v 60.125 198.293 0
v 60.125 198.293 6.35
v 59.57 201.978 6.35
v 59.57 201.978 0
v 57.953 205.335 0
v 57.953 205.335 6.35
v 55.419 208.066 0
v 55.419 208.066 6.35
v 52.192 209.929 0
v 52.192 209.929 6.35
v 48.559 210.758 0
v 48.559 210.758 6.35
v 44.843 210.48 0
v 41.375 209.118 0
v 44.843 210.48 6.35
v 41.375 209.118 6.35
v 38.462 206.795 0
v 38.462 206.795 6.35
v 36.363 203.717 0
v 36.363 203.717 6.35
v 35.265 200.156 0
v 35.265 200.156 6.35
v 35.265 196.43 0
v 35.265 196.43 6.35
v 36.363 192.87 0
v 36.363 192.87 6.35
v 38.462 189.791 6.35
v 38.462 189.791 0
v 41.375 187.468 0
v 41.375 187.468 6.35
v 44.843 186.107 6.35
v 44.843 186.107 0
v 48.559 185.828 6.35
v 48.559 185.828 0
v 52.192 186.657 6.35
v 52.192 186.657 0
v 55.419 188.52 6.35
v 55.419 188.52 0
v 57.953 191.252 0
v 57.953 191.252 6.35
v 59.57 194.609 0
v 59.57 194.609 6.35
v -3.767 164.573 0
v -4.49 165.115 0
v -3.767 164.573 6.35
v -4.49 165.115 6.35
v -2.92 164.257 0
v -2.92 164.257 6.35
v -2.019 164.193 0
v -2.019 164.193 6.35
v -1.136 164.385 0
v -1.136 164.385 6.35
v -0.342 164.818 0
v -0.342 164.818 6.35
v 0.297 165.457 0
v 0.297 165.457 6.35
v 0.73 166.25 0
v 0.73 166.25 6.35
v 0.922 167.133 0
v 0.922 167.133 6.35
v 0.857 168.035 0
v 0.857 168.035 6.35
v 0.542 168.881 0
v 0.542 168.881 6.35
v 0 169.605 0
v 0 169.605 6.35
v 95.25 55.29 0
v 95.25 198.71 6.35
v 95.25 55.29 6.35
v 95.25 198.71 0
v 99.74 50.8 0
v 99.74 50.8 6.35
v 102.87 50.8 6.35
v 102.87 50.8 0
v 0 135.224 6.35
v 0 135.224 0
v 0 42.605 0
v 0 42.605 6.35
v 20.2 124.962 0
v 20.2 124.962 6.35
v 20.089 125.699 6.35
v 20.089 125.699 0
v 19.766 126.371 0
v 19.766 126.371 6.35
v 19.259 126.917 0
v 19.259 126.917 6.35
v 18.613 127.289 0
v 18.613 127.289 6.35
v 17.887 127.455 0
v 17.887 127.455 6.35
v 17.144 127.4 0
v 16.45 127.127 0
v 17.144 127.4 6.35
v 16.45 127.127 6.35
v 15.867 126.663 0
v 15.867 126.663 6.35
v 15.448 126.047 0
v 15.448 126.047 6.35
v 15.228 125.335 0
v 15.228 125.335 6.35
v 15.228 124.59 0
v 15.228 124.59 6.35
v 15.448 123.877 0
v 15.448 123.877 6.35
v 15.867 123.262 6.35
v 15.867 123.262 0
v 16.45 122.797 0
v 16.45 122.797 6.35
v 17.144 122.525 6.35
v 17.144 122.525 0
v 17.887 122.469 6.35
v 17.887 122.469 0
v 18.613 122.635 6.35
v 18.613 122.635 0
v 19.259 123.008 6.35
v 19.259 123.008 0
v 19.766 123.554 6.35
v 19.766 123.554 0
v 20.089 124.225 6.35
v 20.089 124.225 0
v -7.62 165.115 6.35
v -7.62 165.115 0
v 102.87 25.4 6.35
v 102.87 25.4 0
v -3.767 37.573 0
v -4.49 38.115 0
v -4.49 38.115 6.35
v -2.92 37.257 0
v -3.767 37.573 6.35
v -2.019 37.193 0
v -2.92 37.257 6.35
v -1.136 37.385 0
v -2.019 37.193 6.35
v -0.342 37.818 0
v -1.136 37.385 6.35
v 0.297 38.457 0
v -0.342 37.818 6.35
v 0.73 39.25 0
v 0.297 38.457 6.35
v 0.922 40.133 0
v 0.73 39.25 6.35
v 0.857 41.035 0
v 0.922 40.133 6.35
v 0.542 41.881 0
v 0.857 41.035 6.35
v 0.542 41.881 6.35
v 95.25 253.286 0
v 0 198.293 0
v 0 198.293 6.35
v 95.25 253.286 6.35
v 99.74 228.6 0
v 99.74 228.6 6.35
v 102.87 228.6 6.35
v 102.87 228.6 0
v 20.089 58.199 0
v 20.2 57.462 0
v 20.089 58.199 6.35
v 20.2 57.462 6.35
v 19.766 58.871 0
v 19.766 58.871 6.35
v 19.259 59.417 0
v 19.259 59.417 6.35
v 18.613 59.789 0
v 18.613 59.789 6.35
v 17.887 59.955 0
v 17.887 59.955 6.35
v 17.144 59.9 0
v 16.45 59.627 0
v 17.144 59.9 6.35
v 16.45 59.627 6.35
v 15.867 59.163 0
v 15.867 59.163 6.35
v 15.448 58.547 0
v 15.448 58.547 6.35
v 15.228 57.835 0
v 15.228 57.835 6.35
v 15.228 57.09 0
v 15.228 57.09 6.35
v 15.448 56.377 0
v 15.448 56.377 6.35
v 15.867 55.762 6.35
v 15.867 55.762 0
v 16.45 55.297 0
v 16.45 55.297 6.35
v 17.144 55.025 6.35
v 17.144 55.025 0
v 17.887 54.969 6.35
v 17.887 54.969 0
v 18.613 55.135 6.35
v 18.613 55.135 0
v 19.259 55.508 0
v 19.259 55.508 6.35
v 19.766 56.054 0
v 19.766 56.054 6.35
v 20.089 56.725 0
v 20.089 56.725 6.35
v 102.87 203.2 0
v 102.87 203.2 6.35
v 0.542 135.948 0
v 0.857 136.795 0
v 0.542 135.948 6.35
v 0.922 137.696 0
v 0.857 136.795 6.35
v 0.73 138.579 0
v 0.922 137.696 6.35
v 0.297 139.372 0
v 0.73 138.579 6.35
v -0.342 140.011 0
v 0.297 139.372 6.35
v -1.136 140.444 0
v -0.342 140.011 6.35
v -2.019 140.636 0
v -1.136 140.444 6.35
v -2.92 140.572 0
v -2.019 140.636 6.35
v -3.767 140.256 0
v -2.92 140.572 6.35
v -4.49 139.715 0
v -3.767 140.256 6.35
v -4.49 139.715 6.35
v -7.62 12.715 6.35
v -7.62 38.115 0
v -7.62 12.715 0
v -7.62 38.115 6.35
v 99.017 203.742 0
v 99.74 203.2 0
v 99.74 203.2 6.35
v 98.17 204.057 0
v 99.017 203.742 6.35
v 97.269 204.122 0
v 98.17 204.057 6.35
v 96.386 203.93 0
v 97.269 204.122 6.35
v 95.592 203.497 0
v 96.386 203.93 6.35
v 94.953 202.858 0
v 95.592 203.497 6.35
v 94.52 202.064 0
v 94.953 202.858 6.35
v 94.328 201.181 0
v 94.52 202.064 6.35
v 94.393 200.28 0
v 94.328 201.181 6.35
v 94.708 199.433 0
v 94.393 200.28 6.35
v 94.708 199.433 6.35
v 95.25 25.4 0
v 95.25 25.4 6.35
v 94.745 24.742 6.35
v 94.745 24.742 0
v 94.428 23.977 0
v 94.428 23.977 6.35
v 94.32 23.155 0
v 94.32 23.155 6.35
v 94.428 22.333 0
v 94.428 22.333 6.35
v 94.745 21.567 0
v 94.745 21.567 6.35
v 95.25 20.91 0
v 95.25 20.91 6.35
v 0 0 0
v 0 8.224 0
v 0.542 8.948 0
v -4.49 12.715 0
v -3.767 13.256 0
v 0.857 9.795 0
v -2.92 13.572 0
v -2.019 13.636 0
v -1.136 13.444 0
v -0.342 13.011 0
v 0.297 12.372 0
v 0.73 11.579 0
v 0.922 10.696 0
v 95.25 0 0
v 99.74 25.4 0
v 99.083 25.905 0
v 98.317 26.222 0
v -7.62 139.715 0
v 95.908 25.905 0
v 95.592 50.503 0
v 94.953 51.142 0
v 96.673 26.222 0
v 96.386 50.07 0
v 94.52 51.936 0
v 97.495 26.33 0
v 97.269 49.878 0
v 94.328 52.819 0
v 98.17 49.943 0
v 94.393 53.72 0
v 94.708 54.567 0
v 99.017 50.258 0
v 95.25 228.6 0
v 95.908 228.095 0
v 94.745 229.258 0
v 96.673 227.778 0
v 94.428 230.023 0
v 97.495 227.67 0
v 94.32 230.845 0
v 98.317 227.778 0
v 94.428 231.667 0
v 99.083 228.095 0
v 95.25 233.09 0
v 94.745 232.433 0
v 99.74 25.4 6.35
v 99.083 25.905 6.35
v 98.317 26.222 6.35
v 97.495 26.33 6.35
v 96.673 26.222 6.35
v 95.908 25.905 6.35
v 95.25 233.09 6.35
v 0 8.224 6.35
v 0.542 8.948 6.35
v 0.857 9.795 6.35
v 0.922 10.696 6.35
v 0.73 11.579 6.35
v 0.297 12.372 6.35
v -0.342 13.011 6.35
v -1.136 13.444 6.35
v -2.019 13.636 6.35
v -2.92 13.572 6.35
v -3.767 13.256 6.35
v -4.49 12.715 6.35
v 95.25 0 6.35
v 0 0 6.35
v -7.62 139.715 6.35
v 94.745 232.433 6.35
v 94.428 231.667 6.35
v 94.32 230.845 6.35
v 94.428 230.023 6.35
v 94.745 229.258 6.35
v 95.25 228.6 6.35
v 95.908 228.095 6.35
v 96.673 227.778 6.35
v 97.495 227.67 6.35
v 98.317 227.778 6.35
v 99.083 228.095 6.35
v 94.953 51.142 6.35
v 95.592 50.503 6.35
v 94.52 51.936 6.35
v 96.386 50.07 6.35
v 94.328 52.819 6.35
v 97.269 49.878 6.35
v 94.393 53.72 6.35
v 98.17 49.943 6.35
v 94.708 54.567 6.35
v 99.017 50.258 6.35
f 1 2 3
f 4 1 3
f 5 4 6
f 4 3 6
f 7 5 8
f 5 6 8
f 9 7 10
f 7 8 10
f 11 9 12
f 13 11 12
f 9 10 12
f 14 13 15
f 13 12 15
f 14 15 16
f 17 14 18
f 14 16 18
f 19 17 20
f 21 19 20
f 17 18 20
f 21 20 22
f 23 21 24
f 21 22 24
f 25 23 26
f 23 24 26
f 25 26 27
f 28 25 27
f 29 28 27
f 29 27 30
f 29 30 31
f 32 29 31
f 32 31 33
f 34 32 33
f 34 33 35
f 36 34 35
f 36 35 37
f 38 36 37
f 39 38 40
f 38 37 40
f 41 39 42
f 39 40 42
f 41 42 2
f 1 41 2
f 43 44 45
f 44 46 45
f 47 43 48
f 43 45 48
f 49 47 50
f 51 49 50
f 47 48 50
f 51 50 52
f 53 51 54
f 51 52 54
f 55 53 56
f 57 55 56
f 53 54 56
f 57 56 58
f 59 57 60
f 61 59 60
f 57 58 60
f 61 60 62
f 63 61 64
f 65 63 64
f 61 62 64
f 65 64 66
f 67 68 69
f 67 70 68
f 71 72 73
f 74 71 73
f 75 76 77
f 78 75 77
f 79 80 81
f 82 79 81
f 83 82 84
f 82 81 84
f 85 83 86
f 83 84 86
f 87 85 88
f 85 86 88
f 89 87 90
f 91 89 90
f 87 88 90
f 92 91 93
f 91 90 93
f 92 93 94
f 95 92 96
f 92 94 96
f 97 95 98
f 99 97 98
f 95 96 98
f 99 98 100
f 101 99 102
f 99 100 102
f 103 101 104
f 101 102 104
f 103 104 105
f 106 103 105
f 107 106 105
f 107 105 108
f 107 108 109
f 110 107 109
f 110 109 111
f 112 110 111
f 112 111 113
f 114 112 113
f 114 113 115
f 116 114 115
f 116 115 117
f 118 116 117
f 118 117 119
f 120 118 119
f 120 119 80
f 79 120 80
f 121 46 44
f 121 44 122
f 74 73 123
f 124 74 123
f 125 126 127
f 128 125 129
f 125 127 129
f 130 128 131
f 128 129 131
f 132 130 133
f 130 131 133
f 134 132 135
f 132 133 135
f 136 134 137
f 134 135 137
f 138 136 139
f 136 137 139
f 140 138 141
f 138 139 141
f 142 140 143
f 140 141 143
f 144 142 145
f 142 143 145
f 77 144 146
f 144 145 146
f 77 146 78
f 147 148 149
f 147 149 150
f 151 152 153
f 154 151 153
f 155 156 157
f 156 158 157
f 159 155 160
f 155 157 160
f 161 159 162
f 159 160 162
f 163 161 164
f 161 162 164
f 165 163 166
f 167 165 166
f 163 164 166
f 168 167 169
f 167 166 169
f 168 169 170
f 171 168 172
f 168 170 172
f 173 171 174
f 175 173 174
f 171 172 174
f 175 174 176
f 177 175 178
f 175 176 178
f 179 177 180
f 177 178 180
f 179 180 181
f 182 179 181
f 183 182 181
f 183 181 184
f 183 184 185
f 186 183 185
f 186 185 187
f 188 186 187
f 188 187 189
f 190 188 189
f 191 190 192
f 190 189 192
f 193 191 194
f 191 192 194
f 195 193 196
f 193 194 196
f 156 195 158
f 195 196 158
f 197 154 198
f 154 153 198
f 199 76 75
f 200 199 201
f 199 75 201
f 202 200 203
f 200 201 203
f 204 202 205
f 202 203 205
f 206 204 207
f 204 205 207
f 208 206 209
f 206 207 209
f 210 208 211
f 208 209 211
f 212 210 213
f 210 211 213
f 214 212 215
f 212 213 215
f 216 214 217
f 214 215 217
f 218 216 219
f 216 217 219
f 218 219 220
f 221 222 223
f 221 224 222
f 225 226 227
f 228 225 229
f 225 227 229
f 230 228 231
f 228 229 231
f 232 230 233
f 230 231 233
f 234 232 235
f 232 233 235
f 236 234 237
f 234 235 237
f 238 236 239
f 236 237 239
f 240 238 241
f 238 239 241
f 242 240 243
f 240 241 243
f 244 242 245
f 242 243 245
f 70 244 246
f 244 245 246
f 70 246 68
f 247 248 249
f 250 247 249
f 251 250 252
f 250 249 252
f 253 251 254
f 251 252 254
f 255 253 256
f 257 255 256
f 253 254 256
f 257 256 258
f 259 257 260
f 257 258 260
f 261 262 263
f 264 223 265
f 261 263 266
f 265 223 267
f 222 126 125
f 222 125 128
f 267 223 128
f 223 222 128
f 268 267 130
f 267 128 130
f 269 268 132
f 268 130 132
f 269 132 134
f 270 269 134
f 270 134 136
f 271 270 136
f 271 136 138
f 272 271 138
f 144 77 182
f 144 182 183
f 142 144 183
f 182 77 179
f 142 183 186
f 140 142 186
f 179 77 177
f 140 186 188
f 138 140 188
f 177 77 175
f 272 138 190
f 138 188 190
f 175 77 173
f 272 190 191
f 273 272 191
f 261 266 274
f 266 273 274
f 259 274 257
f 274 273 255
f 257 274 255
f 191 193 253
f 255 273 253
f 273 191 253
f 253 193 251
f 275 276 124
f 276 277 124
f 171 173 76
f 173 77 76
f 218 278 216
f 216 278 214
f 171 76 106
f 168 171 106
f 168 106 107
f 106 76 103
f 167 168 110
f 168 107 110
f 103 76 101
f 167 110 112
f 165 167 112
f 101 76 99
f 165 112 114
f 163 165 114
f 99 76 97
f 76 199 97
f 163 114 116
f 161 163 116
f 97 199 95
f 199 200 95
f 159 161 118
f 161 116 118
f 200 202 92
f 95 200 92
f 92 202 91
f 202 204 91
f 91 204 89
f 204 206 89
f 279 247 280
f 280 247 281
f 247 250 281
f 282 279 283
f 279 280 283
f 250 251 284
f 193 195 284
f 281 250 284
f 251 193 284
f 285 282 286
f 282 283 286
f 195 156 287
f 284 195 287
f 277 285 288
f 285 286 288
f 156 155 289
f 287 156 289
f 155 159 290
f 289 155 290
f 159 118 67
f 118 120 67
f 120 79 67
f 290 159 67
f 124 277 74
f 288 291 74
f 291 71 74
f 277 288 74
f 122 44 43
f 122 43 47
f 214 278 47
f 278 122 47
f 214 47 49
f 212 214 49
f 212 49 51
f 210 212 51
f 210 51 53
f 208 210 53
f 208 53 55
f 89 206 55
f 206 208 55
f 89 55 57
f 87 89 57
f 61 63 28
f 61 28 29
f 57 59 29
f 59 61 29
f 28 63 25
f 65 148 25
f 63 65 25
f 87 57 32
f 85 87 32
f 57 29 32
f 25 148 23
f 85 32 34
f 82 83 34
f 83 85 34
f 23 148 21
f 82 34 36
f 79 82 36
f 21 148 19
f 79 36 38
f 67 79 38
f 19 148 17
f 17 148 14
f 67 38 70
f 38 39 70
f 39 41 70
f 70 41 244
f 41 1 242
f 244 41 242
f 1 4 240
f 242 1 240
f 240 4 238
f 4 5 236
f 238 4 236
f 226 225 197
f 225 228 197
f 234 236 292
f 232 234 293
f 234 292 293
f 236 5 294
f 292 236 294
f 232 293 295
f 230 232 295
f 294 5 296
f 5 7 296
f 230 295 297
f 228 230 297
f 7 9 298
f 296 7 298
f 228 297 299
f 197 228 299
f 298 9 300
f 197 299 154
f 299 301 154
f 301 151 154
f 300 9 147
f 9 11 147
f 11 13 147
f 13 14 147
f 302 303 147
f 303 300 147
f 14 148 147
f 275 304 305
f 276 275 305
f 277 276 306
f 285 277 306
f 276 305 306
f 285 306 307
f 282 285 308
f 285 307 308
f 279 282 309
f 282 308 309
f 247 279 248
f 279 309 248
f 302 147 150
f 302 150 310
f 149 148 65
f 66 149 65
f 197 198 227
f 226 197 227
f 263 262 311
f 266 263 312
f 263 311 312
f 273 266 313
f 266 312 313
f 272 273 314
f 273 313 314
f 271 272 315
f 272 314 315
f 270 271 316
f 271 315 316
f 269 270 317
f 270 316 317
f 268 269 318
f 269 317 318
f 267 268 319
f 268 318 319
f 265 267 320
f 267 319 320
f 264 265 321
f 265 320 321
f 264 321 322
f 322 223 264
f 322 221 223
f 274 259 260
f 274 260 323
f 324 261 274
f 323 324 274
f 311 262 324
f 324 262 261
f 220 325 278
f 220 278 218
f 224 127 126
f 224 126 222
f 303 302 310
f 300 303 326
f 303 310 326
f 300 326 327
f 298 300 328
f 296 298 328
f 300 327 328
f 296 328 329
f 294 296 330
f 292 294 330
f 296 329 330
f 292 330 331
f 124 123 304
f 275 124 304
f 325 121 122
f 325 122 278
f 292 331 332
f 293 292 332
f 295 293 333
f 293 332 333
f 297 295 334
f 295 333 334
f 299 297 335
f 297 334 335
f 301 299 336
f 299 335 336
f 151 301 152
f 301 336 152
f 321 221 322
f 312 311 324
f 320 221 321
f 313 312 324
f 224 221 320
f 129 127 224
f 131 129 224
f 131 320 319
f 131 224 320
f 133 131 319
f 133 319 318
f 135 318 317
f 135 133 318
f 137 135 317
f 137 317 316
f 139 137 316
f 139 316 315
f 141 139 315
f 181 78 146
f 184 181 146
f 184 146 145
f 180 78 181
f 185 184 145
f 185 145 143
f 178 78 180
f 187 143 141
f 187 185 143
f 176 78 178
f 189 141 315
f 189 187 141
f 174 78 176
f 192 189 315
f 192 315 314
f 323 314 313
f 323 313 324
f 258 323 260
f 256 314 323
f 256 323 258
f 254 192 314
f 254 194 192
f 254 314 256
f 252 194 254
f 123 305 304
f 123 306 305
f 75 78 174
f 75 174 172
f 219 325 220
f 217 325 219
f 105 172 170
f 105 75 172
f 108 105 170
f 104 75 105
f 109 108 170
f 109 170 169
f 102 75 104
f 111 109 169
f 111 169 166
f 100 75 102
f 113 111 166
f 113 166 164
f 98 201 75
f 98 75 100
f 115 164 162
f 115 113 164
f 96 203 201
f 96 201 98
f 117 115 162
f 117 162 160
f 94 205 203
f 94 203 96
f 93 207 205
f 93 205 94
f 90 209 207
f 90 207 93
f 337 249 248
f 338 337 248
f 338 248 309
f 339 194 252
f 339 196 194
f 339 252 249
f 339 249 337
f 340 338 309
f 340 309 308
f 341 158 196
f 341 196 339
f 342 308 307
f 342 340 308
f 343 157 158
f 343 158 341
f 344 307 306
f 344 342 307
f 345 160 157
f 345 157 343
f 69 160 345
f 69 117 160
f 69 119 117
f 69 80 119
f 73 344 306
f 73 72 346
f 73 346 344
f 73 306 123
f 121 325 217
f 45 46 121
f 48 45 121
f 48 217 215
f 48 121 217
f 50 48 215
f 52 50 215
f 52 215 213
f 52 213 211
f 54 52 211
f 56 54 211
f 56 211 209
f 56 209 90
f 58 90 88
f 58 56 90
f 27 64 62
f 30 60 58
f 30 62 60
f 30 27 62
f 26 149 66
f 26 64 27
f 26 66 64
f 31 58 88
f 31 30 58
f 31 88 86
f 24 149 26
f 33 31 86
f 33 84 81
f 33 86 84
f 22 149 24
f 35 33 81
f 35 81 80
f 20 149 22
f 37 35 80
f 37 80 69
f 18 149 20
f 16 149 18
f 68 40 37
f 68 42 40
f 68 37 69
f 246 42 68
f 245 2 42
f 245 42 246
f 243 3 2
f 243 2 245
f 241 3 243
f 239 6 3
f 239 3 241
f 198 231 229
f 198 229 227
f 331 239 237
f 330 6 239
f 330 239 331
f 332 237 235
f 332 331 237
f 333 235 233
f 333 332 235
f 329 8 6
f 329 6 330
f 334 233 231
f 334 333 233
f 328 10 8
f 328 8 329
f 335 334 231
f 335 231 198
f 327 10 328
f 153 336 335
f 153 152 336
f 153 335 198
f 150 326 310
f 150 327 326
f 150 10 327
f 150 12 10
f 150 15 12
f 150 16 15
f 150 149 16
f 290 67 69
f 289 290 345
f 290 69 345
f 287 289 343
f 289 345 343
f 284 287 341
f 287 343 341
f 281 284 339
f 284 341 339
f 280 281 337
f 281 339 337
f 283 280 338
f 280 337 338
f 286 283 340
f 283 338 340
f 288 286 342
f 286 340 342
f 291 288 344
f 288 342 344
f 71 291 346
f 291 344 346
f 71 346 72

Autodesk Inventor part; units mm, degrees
ref_plane "YZ Plane" through (0, 0, 0) normal (1, 0, 0) x (0, 1, 0)
ref_plane "XZ Plane" through (0, 0, 0) normal (0, 1, 0) x (-1, 0, 0)
ref_plane "XY Plane" through (0, 0, 0) normal (0, 0, 1) x (1, 0, 0)
sketch "Sketch1" plane through (0, 0, 0) normal (0, 0, 1) x (1, 0, 0)
  line L0 (0, 0) -> (95.25, 0)
  line L1 (95.25, 0) -> (95.25, 198.2931)
  line L2 (95.25, 198.2931) -> (0, 198.2931)
  line L3 (0, 198.2931) -> (0, 0)
  line L4 (0, 198.2931) -> (95.25, 253.2857)
  line L5 (95.25, 253.2857) -> (95.25, 198.2646)
  dimension "d0" = 95.25
  dimension "d1" = 198.293
  dimension "d2" = 60
extrude "Extrusion1" add sketch "Sketch1" along normal blind 6.35
sketch "Sketch2" plane through (0, 0, 6.35) normal (0, 0, 1) x (1, 0, 0)
  line L0 (0, 198.2931) -> (0, 0) projected
  line L1 (0, 38.1146) -> (-7.62, 38.1146)
  line L2 (-7.62, 38.1146) -> (-7.62, 12.7146)
  line L3 (-7.62, 12.7146) -> (0, 12.7146)
  line L4 (0, 12.7146) -> (0, 38.1146)
  line L5 (0, 165.1146) -> (-7.62, 165.1146)
  line L6 (-7.62, 165.1146) -> (-7.62, 139.7146)
  line L7 (-7.62, 139.7146) -> (0, 139.7146)
  line L8 (0, 139.7146) -> (0, 165.1146)
  line L9 (0, 0) -> (95.25, 0) projected
  dimension "d5" = 7.62
  dimension "d6" = 25.4
  dimension "d7" = 25.4
  dimension "d8" = 101.6
  dimension "d9" = 12.7146
extrude "Extrusion2" add sketch "Sketch2" against normal blind 6.35
sketch "Sketch3" plane through (0, 0, 6.35) normal (0, 0, 1) x (1, 0, 0)
  line L0 (95.25, 0) -> (95.25, 253.2857) projected
  line L1 (95.25, 228.6) -> (102.87, 228.6)
  line L2 (102.87, 228.6) -> (102.87, 203.2)
  line L3 (102.87, 203.2) -> (95.25, 203.2)
  line L4 (95.25, 203.2) -> (95.25, 228.6)
  line L5 (95.25, 50.8) -> (102.87, 50.8)
  line L6 (102.87, 50.8) -> (102.87, 25.4)
  line L7 (102.87, 25.4) -> (95.25, 25.4)
  line L8 (95.25, 25.4) -> (95.25, 50.8)
  line L9 (102.87, 215.9) -> (102.87, 38.1) construction
  line L10 (0, 0) -> (95.25, 0) projected
  point P0 (102.87, 127)
  point P1 (95.25, 126.6428)
  dimension "d13" = 25.4
  dimension "d14" = 7.62
  dimension "d15" = 25.4
  dimension "d16" = 177.8
  dimension "d19" = 25.4
extrude "Extrusion3" add sketch "Sketch3" against normal blind 6.35
sketch "Sketch4" plane through (0, 0, 6.35) normal (0, 0, 1) x (1, 0, 0)
  circle A0 centre (17.7, 124.9622) radius 2.5
  circle A1 centre (17.7, 57.4622) radius 2.5
  line L0 (0, 139.7146) -> (0, 38.1146) projected
  line L1 (0, 0) -> (95.25, 0) projected
  dimension "d20" = 5
  dimension "d21" = 5
  dimension "d22" = 17.7
  dimension "d23" = 67.5
  dimension "d24" = 57.4622
extrude "Extrusion4" cut sketch "Sketch4" against normal through all
sketch "Sketch5" plane through (0, 0, 6.35) normal (0, 0, 1) x (1, 0, 0)
  circle A0 centre (47.625, 198.2931) radius 12.5
  line L0 (0, 0) -> (95.25, 0) projected
  point P0 (0, 198.2931)
  point P1 (47.625, 0)
  dimension "d27" = 25
extrude "Extrusion5" cut sketch "Sketch5" against normal through all
sketch "Sketch6" plane through (0, 0, 6.35) normal (0, 0, 1) x (1, 0, 0)
  circle A0 centre (47.625, 198.2931) radius 12.5 construction
  circle A1 centre (17.7, 124.9622) radius 2.5 construction
  circle A2 centre (17.7, 57.4622) radius 2.5 construction
  line L0 (95.25, 0) -> (95.25, 25.4) construction
  line L1 (95.25, 25.4) -> (102.87, 25.4) construction
  line L2 (102.87, 25.4) -> (102.87, 50.8) construction
  line L3 (102.87, 50.8) -> (95.25, 50.8) construction
  line L4 (95.25, 50.8) -> (95.25, 203.2) construction
  line L5 (95.25, 203.2) -> (102.87, 203.2) construction
  line L6 (102.87, 203.2) -> (102.87, 228.6) construction
  line L7 (102.87, 228.6) -> (95.25, 228.6) construction
  line L8 (95.25, 228.6) -> (95.25, 253.2857) construction
  line L9 (95.25, 253.2857) -> (0, 198.2931) construction
  line L10 (0, 198.2931) -> (0, 165.1146) construction
  line L11 (0, 165.1146) -> (-7.62, 165.1146) construction
  line L12 (-7.62, 165.1146) -> (-7.62, 139.7146) construction
  line L13 (-7.62, 139.7146) -> (0, 139.7146) construction
  line L14 (0, 139.7146) -> (0, 38.1146) construction
  line L15 (0, 38.1146) -> (-7.62, 38.1146) construction
  line L16 (-7.62, 38.1146) -> (-7.62, 12.7146) construction
  line L17 (-7.62, 12.7146) -> (0, 12.7146) construction
  line L18 (0, 12.7146) -> (0, 0) construction
  line L19 (0, 0) -> (95.25, 0) construction
  line L20 (-2.2451, 167.3597) -> (-2.2451, 199.5892) construction
  line L21 (-2.2451, 199.5892) -> (97.4951, 257.1742) construction
  line L22 (97.4951, 257.1742) -> (97.4951, 230.8451) construction
  line L23 (97.4951, 230.8451) -> (105.1151, 230.8451) construction
  line L24 (105.1151, 230.8451) -> (105.1151, 200.9549) construction
  line L25 (105.1151, 200.9549) -> (97.4951, 200.9549) construction
  line L26 (97.4951, 200.9549) -> (97.4951, 53.0451) construction
  line L27 (97.4951, 53.0451) -> (105.1151, 53.0451) construction
  line L28 (105.1151, 53.0451) -> (105.1151, 23.1549) construction
  line L29 (105.1151, 23.1549) -> (97.4951, 23.1549) construction
  line L30 (97.4951, 23.1549) -> (97.4951, -2.2451) construction
  line L31 (97.4951, -2.2451) -> (-2.2451, -2.2451) construction
  line L32 (-2.2451, -2.2451) -> (-2.2451, 10.4695) construction
  line L33 (-2.2451, 10.4695) -> (-9.8651, 10.4695) construction
  line L34 (-9.8651, 10.4695) -> (-9.8651, 40.3597) construction
  line L35 (-9.8651, 40.3597) -> (-2.2451, 40.3597) construction
  line L36 (-2.2451, 40.3597) -> (-2.2451, 137.4695) construction
  line L37 (-2.2451, 137.4695) -> (-9.8651, 137.4695) construction
  line L38 (-9.8651, 137.4695) -> (-9.8651, 167.3597) construction
  line L39 (-9.8651, 167.3597) -> (-2.2451, 167.3597) construction
  circle A3 centre (97.4951, 230.8451) radius 3.175
  line L40 (95.25, 50.8) -> (95.25, 203.2) projected
  circle A4 centre (97.4951, 200.9549) radius 3.175
  circle A5 centre (97.4951, 53.0451) radius 3.175
  circle A6 centre (97.4951, 23.1549) radius 3.175
  line L41 (0, 12.7146) -> (0, 0) projected
  circle A7 centre (-2.2451, 10.4695) radius 3.175
  line L42 (0, 139.7146) -> (0, 38.1146) projected
  circle A8 centre (-2.2451, 40.3597) radius 3.175
  circle A9 centre (-2.2451, 137.4695) radius 3.175
  line L43 (0, 198.2931) -> (0, 165.1146) projected
  circle A10 centre (-2.2451, 167.3597) radius 3.175
  dimension "d30" = 6.35
extrude "Extrusion6" cut sketch "Sketch6" against normal through all
equation "\"d3\" = Panel_Thickness"
equation "\"d5\" = Panel_Thickness + Fit_Tolerance"
equation "\"d10\" = Panel_Thickness"
equation "\"d14\" = Panel_Thickness + Fit_Tolerance"
equation "\"d17\" = Panel_Thickness"
equation "\"d25\" = Panel_Thickness"
equation "\"d28\" = Panel_Thickness"
equation "\"d30\" = Tool_Dia"
equation "\"d31\" = Panel_Thickness"
equation "\"Panel_Thickness\" = 6.35"
equation "\"Fit_Tolerance\" = 1.27"
equation "\"Tool_Dia\" = 6.35"
properties part number "BA23" material "Polyethylene, High Density"
